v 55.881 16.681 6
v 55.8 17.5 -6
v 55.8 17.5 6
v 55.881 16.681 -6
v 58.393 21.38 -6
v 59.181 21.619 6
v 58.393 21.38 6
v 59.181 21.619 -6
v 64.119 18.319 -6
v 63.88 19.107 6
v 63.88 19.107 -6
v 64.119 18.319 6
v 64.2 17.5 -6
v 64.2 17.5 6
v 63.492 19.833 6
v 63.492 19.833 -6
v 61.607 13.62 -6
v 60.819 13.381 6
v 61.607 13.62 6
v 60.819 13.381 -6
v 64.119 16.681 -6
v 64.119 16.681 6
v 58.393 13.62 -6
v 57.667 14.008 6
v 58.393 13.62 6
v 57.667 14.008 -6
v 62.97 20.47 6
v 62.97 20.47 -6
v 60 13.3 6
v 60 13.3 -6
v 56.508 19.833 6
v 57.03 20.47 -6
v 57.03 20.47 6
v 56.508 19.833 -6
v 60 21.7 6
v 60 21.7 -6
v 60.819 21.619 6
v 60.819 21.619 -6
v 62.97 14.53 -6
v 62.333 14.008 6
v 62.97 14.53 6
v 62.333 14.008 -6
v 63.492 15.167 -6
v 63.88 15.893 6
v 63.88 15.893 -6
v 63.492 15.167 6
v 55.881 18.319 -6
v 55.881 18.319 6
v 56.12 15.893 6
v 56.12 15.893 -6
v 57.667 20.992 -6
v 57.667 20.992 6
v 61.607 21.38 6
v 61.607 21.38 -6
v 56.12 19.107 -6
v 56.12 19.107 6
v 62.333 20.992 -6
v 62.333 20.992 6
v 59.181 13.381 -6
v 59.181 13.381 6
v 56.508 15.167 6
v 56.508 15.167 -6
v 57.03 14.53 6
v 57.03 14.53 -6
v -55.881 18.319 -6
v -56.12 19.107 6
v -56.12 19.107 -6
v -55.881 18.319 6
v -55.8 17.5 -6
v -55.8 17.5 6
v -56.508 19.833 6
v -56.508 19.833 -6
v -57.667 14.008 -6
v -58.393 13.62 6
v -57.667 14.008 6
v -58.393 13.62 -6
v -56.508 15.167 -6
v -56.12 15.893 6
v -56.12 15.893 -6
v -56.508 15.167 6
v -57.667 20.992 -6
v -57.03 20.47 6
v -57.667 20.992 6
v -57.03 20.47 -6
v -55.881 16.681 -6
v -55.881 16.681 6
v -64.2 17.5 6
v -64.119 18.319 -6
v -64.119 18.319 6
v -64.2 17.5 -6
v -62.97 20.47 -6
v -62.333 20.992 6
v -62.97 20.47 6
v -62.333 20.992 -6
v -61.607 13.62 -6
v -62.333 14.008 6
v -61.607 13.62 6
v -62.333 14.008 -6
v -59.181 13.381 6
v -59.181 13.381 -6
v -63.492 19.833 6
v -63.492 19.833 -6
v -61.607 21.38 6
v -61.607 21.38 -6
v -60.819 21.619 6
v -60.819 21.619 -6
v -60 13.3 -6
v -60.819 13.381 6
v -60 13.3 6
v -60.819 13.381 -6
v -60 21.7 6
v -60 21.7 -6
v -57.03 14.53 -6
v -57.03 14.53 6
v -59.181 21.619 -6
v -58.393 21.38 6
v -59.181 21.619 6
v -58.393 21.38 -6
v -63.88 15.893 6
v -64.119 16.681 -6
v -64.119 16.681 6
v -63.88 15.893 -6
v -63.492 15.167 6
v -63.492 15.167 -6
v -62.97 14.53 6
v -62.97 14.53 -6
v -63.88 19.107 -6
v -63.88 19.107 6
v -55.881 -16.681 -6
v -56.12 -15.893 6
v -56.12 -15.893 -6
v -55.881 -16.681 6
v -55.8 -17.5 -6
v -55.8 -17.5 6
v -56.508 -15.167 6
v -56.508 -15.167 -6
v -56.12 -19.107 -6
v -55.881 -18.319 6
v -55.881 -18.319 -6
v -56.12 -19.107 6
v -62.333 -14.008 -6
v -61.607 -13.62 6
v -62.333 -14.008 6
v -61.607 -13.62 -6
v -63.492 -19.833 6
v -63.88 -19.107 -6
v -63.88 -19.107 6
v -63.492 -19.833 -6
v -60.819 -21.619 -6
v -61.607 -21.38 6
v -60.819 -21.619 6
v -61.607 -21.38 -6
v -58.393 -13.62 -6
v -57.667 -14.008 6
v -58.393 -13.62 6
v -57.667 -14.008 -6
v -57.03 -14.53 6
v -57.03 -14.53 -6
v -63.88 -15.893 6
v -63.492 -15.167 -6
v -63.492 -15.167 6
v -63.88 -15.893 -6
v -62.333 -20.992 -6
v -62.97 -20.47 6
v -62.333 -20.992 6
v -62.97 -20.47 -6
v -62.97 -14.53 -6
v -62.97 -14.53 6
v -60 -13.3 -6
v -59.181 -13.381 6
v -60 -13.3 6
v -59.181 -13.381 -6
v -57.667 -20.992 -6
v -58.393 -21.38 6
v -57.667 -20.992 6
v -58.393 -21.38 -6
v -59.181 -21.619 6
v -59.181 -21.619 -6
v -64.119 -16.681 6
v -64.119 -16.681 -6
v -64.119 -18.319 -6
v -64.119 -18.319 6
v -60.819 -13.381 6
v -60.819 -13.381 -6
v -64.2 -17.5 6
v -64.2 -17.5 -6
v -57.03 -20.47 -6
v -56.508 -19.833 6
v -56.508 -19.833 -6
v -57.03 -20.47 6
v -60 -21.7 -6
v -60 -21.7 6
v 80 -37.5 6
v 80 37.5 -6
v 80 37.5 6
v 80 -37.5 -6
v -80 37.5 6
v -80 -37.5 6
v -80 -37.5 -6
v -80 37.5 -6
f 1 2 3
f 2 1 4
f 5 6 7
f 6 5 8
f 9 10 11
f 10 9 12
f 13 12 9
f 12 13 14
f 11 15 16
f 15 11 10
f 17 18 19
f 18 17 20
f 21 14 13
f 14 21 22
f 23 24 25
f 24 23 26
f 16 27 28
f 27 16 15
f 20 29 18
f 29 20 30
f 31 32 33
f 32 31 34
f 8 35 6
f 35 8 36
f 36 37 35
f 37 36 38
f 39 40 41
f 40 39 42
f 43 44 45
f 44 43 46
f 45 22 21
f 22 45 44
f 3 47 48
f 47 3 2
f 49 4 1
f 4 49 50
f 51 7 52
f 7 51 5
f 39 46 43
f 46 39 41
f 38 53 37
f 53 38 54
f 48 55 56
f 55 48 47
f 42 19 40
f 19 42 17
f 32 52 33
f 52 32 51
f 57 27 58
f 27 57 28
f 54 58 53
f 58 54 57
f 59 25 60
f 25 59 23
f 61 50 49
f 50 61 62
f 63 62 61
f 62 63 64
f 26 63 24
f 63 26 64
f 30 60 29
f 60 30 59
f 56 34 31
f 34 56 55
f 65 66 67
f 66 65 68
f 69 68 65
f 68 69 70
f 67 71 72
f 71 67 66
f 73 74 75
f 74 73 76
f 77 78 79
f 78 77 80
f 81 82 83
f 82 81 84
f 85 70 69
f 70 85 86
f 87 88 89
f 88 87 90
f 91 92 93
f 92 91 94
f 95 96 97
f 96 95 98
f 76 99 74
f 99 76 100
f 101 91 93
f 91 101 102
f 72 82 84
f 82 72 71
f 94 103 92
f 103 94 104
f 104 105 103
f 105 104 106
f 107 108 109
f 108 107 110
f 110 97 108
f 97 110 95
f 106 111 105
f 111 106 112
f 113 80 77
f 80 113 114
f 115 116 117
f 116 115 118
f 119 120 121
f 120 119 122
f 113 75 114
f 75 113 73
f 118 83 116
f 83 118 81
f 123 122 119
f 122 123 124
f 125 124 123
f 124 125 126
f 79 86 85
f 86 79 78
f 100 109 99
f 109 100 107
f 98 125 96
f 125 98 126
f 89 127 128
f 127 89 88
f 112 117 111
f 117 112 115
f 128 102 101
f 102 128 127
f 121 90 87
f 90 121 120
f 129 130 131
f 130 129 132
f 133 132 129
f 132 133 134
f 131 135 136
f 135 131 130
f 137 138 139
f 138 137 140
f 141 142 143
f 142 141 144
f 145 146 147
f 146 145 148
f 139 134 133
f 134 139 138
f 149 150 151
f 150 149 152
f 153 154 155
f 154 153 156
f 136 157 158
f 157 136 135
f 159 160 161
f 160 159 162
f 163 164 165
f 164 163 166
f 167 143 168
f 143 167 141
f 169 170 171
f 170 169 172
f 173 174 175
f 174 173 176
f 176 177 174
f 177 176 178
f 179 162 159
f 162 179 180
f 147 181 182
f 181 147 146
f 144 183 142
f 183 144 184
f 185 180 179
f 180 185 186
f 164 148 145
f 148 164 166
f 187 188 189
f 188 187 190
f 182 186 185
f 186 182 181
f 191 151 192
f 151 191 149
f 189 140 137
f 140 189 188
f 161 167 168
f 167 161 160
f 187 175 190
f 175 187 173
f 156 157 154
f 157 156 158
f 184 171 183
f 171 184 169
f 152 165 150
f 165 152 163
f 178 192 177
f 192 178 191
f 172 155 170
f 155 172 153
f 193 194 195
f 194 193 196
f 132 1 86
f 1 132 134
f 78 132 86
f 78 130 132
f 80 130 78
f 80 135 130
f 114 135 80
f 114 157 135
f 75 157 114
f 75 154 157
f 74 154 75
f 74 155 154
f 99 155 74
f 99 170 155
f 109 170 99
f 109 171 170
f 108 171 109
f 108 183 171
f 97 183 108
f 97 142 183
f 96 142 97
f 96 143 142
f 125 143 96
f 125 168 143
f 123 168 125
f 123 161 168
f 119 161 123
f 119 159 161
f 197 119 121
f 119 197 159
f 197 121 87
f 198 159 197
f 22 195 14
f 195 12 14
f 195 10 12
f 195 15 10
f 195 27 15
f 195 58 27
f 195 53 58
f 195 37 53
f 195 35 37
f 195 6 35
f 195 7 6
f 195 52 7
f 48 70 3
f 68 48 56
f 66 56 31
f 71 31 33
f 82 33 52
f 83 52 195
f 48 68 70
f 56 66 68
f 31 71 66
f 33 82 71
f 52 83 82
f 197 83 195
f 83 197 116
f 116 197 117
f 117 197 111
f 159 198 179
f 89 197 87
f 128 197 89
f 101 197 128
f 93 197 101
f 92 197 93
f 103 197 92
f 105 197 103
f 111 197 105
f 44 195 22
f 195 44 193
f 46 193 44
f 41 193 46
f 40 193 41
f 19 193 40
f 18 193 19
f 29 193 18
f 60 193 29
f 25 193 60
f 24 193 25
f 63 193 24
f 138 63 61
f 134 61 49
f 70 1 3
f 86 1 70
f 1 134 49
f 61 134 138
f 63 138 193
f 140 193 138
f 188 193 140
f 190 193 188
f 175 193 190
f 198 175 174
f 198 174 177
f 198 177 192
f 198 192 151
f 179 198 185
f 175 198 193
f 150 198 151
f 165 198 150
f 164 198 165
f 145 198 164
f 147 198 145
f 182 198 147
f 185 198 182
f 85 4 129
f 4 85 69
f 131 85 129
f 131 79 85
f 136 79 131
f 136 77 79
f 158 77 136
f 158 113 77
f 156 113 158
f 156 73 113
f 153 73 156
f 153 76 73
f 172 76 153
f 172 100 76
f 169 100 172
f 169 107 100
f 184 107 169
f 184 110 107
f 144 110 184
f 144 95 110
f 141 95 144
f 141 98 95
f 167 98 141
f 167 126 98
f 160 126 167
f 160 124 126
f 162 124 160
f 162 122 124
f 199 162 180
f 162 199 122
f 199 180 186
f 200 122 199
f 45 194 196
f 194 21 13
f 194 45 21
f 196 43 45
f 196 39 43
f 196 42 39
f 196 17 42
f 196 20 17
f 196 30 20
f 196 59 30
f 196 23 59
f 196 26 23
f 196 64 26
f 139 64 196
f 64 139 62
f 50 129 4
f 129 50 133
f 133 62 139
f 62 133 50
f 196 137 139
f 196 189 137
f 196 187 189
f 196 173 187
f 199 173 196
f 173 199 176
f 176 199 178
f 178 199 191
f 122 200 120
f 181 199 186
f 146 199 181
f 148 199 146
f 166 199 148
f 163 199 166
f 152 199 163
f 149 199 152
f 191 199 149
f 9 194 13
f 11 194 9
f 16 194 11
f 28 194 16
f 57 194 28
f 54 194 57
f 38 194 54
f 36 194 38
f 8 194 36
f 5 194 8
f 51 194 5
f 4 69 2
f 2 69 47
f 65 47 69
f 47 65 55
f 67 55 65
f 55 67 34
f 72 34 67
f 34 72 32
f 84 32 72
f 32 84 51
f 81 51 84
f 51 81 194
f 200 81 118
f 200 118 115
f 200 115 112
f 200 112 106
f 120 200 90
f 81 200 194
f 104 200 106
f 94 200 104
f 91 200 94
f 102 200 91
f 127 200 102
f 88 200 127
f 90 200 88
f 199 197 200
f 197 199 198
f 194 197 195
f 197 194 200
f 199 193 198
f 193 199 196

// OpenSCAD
$fn = 32;

// ----------------------------------------------------------------------
// Corner plate 160 x 75 x 12
// 3 holes, centres taken from the edge offset
// ----------------------------------------------------------------------

// --- parameters (mm) ---
plate = [160, 75, 12];  // overall size (x, y, z)
holes = 3;              // number of holes the drawing asks for
hole_d = 8.4;           // hole diameter
edge = 20;              // hole centre offset from the plate edge

// --- derived feature positions (mm) ---
corner_x = plate[0] / 2 - edge;  // = 60   corner hole X
corner_y = plate[1] / 2 - edge;  // = 17.5   corner hole Y
feature_centers = [
  [corner_x, corner_y],
  [-corner_x, corner_y],
  [-corner_x, -corner_y]
];   // hole centres the loop below drills

// plate outline, every hole drilled through with the same cutters
difference() {
  cube(plate, center = true);
  for (centre = feature_centers)
    translate([centre[0], centre[1], 0])
      cylinder(d = hole_d, h = plate[2] + 2, center = true);
}
